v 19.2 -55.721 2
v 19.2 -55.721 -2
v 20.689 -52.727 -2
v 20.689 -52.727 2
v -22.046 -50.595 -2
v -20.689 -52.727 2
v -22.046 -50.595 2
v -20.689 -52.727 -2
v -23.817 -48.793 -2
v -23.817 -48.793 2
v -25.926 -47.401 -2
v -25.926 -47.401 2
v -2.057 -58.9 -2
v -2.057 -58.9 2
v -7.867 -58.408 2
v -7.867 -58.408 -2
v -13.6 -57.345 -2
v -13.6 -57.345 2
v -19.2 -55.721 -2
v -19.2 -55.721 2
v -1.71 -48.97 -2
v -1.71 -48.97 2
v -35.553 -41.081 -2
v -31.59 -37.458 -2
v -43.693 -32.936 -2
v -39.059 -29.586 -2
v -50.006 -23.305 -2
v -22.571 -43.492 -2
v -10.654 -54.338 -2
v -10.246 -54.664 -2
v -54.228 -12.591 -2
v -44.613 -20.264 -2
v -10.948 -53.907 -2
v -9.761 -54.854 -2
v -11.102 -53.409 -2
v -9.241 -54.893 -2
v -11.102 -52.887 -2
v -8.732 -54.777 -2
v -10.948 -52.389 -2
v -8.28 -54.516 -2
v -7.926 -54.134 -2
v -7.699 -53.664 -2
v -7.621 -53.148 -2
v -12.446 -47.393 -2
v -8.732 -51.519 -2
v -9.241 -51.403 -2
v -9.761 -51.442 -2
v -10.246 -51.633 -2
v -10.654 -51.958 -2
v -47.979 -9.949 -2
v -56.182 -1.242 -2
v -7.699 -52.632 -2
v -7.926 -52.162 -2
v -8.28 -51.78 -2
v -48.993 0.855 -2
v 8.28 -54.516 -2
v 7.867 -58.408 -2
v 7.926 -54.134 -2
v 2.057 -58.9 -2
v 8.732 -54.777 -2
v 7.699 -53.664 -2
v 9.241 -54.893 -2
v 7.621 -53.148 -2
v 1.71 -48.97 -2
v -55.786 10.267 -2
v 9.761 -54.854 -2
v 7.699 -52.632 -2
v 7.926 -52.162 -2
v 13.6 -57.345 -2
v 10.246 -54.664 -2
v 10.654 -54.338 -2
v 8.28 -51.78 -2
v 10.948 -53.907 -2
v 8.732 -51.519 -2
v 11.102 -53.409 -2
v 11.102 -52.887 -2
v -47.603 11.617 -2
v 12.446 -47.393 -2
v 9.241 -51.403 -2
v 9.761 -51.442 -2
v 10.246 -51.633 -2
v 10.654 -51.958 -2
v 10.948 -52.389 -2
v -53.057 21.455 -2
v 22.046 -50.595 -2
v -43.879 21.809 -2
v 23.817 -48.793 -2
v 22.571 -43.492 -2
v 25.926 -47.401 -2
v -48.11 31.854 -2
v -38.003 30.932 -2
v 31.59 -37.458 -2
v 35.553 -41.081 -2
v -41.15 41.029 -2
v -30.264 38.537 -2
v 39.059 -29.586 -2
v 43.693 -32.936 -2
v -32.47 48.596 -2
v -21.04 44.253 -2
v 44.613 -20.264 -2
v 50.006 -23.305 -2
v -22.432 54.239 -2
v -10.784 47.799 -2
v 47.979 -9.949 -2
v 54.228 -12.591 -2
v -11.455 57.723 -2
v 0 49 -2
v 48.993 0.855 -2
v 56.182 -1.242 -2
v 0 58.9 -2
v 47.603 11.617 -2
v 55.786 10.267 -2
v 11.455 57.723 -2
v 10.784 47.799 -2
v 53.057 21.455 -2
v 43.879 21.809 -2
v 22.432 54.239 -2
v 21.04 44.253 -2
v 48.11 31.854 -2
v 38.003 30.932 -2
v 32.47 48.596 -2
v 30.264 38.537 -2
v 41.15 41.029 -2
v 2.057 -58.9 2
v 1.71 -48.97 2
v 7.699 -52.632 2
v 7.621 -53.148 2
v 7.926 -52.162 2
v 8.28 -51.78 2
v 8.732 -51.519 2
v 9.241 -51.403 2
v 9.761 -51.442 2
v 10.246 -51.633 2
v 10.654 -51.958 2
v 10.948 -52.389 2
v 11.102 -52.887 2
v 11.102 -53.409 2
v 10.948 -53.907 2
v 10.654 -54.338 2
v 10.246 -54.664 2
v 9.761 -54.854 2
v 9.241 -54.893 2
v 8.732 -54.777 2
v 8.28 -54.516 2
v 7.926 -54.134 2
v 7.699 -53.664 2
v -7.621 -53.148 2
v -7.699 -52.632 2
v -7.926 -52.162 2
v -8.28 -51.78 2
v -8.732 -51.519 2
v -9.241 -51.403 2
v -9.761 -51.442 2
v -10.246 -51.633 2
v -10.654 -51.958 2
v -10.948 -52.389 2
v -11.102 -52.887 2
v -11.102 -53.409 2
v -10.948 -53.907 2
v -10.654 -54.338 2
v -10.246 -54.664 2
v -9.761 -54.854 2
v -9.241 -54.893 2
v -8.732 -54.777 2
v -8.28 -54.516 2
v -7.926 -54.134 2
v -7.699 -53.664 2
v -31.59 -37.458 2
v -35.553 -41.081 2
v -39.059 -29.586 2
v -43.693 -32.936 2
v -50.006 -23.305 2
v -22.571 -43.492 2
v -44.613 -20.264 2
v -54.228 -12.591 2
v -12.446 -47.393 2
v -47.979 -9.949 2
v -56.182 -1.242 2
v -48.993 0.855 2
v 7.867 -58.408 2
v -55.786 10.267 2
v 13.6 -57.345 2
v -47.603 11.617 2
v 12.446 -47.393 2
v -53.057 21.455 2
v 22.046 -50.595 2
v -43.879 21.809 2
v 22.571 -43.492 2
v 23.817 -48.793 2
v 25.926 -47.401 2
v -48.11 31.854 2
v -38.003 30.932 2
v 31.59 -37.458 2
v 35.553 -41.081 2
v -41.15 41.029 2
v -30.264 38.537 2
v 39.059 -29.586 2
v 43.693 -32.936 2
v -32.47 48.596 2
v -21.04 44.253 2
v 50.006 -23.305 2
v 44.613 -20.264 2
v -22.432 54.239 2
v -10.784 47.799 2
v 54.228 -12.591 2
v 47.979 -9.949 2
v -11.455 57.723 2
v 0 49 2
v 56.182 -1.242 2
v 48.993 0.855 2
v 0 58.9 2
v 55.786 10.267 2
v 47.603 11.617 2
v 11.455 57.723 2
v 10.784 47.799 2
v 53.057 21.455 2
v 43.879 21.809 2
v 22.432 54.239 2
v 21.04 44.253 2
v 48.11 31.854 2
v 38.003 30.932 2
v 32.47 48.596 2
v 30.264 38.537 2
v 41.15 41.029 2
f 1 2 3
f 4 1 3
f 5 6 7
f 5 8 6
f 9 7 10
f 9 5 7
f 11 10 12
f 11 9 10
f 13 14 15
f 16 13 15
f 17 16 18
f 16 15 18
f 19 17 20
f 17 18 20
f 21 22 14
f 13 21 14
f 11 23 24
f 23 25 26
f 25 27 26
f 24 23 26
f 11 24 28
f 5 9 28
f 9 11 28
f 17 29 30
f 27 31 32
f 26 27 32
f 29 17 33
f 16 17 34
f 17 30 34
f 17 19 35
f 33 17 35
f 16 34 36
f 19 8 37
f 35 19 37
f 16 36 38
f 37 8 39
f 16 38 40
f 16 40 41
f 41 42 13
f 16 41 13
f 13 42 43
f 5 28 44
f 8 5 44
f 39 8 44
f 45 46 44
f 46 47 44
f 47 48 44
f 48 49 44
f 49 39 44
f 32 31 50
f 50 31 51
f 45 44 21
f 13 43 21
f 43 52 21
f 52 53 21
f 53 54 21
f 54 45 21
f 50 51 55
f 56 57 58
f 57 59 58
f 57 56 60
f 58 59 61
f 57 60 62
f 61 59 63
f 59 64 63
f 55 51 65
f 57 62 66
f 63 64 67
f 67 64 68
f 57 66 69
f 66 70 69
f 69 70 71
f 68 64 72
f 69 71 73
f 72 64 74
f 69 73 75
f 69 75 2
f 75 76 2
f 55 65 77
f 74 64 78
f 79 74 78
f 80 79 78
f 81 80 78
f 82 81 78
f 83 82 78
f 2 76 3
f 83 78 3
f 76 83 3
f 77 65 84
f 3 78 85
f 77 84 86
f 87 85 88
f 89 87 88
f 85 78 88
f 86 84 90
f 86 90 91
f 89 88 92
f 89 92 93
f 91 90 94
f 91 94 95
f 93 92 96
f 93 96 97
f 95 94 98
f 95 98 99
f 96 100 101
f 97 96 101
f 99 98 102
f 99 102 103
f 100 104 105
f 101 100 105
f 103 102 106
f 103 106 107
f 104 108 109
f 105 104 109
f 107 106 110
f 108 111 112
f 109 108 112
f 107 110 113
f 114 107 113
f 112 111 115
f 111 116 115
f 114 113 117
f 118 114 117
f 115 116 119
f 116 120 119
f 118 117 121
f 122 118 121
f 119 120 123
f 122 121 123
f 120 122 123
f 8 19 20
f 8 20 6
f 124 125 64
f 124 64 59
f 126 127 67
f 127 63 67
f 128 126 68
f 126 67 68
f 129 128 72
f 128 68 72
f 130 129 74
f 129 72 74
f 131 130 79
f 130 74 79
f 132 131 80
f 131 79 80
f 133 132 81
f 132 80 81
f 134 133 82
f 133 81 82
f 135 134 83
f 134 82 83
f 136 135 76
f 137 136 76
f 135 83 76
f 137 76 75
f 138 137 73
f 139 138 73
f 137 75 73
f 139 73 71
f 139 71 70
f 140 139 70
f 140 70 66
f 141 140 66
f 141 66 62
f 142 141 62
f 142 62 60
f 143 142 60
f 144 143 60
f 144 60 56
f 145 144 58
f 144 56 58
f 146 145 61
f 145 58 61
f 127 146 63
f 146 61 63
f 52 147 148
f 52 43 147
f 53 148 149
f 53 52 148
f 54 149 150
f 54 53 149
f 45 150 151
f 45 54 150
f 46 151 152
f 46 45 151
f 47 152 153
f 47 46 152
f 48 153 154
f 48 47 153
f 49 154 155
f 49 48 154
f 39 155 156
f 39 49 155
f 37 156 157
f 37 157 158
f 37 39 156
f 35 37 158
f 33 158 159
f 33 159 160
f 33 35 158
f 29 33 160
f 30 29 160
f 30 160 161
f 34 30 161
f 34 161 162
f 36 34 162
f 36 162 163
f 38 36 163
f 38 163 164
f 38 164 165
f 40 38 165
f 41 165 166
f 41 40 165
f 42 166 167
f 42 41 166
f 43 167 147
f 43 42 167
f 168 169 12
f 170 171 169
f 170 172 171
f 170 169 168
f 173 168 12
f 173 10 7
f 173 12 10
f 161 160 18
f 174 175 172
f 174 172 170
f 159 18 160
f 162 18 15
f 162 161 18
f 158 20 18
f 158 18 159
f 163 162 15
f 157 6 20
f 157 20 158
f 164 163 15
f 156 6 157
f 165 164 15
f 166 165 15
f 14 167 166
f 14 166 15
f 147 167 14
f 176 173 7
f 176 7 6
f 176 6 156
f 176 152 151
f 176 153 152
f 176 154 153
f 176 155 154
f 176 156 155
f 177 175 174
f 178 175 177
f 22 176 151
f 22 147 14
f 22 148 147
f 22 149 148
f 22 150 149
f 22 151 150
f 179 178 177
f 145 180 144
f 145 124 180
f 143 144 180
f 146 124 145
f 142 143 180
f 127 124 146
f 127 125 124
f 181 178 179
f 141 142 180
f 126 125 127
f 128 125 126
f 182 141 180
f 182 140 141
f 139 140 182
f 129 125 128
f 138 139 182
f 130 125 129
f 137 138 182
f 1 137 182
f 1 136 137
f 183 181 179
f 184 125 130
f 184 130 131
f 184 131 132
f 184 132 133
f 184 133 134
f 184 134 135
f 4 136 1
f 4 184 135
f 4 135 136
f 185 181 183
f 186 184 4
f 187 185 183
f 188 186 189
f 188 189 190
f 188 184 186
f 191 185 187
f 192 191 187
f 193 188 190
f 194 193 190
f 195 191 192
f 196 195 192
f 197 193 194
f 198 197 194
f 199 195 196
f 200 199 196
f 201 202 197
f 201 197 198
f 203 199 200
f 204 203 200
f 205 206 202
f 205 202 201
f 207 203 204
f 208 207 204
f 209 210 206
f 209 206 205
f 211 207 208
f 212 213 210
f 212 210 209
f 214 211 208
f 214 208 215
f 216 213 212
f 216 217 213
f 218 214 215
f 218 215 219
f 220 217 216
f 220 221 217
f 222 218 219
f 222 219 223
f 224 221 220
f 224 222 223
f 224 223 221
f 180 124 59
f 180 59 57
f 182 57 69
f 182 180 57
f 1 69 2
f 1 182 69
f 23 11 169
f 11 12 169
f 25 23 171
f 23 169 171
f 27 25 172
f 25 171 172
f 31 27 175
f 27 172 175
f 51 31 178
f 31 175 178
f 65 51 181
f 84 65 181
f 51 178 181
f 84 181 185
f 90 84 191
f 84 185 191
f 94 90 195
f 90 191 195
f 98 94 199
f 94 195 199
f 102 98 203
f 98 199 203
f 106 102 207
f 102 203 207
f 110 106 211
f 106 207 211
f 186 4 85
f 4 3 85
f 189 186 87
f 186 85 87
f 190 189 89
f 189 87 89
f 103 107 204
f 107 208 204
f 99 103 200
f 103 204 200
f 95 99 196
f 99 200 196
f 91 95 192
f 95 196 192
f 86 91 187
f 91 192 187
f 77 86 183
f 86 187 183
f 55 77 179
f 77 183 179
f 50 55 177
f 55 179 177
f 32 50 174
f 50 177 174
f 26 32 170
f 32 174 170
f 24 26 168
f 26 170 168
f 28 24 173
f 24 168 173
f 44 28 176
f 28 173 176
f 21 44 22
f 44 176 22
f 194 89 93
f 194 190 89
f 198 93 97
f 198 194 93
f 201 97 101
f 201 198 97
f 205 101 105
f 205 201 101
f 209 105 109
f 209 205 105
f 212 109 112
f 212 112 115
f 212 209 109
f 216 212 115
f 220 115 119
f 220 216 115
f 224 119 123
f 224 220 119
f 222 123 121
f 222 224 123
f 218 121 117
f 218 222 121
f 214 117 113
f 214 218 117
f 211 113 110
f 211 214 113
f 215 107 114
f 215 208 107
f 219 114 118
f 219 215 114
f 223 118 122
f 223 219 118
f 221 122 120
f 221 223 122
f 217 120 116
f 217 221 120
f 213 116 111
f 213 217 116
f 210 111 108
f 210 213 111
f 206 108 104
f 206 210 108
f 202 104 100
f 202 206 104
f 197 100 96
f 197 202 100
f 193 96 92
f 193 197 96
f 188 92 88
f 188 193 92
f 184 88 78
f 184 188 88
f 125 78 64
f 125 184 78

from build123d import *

# Parameters (mm, degrees)
SKETCH4_R           = 1.75
BOSS_EXTRUDE1_DEPTH = 2
FILLET1_R           = 12.038964726


with BuildPart() as part:
    # Sketch4 → Boss-Extrude1 (new, symmetric)
    with BuildSketch(Plane.XY):
        with BuildLine():
            Line((-19.20029003, -55.720637345), (-22.533190866, -49.018953573))
            ThreePointArc((-22.533190866, -49.018953573), (-55.123146751, 14.097654643), (0, 58.9))
            Line((0, 58.9), (0, 49))
            ThreePointArc((0, 49), (-48.992537063, 0.855167915), (-1.710075338, -48.970150524))
            Line((-1.710075338, -48.970150524), (-2.056833323, -58.9))
            ThreePointArc((-2.056833323, -58.9), (-10.746786033, -57.947796794), (-19.20029003, -55.720637345))
        make_face()
        with Locations((-9.371436357, -53.148056637)):
            Circle(SKETCH4_R, mode=Mode.SUBTRACT)
    extrude(amount=BOSS_EXTRUDE1_DEPTH, both=True)

    # Fillet1
    fillet1_edges = [part.edges().sort_by_distance(p)[0] for p in [
        (-22.533190866, -49.018953573, 0),
    ]]
    fillet(fillet1_edges, radius=FILLET1_R)

    # Mirror1: part across plane


with BuildPart() as part_1:
    add(part.part)
    add(part.part.mirror(Plane(origin=(0, 58.9, 2), x_dir=(0, 0, 1), z_dir=(-1, 0, 0))))


solid = part_1.part
